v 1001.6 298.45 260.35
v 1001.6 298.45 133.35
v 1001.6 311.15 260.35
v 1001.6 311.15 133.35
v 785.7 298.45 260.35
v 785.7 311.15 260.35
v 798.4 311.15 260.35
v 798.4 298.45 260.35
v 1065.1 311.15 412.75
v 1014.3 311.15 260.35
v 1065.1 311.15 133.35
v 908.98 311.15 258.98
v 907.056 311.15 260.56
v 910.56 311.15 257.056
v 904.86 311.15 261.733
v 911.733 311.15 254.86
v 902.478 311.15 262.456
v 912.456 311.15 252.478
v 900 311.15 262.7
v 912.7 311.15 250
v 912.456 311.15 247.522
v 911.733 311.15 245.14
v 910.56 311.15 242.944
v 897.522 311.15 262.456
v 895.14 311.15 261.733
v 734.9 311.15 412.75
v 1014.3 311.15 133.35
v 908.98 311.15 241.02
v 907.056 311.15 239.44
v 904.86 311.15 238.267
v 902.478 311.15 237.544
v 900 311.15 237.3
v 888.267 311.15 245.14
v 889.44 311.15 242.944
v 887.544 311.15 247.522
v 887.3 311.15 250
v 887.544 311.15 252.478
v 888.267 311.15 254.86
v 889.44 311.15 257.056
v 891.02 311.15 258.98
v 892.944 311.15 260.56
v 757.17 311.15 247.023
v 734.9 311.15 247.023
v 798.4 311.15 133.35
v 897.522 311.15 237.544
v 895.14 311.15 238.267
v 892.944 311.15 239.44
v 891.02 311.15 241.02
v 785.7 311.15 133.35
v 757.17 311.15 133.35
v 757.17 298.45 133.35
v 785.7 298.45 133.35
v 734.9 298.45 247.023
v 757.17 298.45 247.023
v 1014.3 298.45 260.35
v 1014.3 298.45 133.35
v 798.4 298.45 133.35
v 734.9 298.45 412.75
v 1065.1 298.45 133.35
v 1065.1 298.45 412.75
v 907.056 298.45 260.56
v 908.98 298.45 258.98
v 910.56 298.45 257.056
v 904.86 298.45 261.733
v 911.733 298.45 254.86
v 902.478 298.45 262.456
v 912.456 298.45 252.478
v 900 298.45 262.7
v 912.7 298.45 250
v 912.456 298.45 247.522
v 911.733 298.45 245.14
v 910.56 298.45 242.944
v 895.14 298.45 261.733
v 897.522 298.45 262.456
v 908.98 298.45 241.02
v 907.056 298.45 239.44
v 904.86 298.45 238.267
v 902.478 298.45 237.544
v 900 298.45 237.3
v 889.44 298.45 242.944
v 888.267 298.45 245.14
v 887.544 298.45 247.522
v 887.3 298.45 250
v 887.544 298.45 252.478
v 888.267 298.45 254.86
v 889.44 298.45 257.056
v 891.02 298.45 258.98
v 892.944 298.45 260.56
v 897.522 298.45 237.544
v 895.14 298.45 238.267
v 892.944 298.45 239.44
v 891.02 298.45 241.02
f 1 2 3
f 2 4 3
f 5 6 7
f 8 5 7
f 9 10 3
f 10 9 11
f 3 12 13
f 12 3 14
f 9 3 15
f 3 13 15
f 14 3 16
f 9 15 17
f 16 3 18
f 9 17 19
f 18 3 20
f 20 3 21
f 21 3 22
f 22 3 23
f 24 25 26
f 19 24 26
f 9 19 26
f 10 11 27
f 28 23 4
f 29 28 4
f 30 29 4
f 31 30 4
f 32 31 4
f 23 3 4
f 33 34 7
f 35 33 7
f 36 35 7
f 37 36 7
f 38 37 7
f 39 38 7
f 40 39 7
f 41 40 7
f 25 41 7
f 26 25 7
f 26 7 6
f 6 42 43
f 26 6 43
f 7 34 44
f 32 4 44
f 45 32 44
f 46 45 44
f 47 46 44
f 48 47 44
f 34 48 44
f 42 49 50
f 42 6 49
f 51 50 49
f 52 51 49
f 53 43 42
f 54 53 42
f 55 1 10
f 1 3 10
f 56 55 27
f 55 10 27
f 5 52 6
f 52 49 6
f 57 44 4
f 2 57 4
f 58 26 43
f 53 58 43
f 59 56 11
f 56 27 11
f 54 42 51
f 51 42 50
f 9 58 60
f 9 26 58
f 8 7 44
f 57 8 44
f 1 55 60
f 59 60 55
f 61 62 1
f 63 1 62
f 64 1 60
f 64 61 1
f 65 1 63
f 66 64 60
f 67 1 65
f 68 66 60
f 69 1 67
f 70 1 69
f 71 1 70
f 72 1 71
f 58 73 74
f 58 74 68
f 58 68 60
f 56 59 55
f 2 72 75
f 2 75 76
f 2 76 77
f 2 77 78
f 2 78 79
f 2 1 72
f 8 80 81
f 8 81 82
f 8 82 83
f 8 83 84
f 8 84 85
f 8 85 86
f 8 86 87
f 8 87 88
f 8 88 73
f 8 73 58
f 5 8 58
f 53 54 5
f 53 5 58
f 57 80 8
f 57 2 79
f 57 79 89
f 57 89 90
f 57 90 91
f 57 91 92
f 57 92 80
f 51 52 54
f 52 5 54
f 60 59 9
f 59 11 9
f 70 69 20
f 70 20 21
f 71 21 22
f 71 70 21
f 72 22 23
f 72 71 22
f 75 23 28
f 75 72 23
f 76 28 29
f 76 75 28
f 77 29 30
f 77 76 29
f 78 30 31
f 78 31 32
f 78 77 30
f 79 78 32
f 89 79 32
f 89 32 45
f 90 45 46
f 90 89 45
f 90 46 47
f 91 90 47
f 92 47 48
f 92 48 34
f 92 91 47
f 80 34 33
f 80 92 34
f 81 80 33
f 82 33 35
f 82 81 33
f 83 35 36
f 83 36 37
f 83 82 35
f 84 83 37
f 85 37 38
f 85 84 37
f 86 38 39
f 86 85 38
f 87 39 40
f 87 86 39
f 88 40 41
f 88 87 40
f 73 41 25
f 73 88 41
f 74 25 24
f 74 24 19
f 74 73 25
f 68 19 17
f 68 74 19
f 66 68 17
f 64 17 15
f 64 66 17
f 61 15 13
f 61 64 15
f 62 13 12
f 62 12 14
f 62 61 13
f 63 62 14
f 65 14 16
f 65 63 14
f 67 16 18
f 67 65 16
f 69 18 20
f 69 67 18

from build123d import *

# Parameters (mm, degrees)
BOSS_EXTRUDE1_DEPTH = 6.35
CAVITY1_START       = 298.45
CAVITY1_OUTLINE_R   = 12.7
CAVITY1_DEPTH       = 12.7
CAVITY1_START_2     = 720.91620239
CAVITY1_2_DEPTH     = 22.43918751
SKETCH2_W           = 22.270177668
SKETCH2_H           = 113.672619585
CUT_EXTRUDE1_DEPTH  = 1143.349273427


# Read off the part's stored shape, not the designer's step: Cavity1
with BuildPart() as part:
    # Sketch1 → Boss-Extrude1 (new, symmetric)
    with BuildSketch(Plane(origin=(0, 304.8, 0), x_dir=(1, 0, 0), z_dir=(0, 1, 0))):
        Polygon((798.4, -133.35), (1001.6, -133.35), (1001.6, -260.35), (1014.3, -260.35), (1014.3, -133.35), (1065.1, -133.35), (1065.1, -412.75), (1014.3, -412.75), (1001.6, -412.75), (798.4, -412.75), (785.7, -412.75), (734.9, -412.75), (734.9, -133.35), (785.7, -133.35), (785.7, -260.35), (798.4, -260.35), align=None)
    extrude(amount=BOSS_EXTRUDE1_DEPTH, both=True)

    # Cavity1 outline → Cavity1 (cut)
    with BuildSketch(Plane(origin=(0, 0, 0), x_dir=(1, 0, 0), z_dir=(0, 1, 0)).offset(CAVITY1_START)):
        with Locations((900, -250)):
            Circle(CAVITY1_OUTLINE_R)
    extrude(amount=CAVITY1_DEPTH, mode=Mode.SUBTRACT)

    # Cavity1 2 outline → Cavity1 2 (cut)
    with BuildSketch(Plane(origin=(0, 0, 0), x_dir=(0.7149295353100829, -0.698752516444498, 0.02491345627949748), z_dir=(0.6991965099607612, 0.7144755512387372, -0.025474048378572107)).offset(CAVITY1_START_2)):
        with BuildLine():
            Line((312, -255.374549574), (314.076314529, -255.435688643))
            ThreePointArc((314.076314529, -255.435688643), (327.146171675, -242.424687318), (313.444242413, -230.081087528))
            Line((313.444242413, -230.081087528), (312, -230.195835843))
            Line((312, -230.195835843), (312, -255.374549574))
        make_face()
    extrude(amount=CAVITY1_2_DEPTH, mode=Mode.SUBTRACT)

    # Sketch2 → Cut-Extrude1 (cut, through all)
    with BuildSketch(Plane(origin=(0, 311.15, 0), x_dir=(1, 0, 0), z_dir=(0, 1, 0))):
        with Locations((746.035088834, -190.186309793)):
            Rectangle(SKETCH2_W, SKETCH2_H)
    extrude(amount=-CUT_EXTRUDE1_DEPTH, mode=Mode.SUBTRACT)


solid = part.part
